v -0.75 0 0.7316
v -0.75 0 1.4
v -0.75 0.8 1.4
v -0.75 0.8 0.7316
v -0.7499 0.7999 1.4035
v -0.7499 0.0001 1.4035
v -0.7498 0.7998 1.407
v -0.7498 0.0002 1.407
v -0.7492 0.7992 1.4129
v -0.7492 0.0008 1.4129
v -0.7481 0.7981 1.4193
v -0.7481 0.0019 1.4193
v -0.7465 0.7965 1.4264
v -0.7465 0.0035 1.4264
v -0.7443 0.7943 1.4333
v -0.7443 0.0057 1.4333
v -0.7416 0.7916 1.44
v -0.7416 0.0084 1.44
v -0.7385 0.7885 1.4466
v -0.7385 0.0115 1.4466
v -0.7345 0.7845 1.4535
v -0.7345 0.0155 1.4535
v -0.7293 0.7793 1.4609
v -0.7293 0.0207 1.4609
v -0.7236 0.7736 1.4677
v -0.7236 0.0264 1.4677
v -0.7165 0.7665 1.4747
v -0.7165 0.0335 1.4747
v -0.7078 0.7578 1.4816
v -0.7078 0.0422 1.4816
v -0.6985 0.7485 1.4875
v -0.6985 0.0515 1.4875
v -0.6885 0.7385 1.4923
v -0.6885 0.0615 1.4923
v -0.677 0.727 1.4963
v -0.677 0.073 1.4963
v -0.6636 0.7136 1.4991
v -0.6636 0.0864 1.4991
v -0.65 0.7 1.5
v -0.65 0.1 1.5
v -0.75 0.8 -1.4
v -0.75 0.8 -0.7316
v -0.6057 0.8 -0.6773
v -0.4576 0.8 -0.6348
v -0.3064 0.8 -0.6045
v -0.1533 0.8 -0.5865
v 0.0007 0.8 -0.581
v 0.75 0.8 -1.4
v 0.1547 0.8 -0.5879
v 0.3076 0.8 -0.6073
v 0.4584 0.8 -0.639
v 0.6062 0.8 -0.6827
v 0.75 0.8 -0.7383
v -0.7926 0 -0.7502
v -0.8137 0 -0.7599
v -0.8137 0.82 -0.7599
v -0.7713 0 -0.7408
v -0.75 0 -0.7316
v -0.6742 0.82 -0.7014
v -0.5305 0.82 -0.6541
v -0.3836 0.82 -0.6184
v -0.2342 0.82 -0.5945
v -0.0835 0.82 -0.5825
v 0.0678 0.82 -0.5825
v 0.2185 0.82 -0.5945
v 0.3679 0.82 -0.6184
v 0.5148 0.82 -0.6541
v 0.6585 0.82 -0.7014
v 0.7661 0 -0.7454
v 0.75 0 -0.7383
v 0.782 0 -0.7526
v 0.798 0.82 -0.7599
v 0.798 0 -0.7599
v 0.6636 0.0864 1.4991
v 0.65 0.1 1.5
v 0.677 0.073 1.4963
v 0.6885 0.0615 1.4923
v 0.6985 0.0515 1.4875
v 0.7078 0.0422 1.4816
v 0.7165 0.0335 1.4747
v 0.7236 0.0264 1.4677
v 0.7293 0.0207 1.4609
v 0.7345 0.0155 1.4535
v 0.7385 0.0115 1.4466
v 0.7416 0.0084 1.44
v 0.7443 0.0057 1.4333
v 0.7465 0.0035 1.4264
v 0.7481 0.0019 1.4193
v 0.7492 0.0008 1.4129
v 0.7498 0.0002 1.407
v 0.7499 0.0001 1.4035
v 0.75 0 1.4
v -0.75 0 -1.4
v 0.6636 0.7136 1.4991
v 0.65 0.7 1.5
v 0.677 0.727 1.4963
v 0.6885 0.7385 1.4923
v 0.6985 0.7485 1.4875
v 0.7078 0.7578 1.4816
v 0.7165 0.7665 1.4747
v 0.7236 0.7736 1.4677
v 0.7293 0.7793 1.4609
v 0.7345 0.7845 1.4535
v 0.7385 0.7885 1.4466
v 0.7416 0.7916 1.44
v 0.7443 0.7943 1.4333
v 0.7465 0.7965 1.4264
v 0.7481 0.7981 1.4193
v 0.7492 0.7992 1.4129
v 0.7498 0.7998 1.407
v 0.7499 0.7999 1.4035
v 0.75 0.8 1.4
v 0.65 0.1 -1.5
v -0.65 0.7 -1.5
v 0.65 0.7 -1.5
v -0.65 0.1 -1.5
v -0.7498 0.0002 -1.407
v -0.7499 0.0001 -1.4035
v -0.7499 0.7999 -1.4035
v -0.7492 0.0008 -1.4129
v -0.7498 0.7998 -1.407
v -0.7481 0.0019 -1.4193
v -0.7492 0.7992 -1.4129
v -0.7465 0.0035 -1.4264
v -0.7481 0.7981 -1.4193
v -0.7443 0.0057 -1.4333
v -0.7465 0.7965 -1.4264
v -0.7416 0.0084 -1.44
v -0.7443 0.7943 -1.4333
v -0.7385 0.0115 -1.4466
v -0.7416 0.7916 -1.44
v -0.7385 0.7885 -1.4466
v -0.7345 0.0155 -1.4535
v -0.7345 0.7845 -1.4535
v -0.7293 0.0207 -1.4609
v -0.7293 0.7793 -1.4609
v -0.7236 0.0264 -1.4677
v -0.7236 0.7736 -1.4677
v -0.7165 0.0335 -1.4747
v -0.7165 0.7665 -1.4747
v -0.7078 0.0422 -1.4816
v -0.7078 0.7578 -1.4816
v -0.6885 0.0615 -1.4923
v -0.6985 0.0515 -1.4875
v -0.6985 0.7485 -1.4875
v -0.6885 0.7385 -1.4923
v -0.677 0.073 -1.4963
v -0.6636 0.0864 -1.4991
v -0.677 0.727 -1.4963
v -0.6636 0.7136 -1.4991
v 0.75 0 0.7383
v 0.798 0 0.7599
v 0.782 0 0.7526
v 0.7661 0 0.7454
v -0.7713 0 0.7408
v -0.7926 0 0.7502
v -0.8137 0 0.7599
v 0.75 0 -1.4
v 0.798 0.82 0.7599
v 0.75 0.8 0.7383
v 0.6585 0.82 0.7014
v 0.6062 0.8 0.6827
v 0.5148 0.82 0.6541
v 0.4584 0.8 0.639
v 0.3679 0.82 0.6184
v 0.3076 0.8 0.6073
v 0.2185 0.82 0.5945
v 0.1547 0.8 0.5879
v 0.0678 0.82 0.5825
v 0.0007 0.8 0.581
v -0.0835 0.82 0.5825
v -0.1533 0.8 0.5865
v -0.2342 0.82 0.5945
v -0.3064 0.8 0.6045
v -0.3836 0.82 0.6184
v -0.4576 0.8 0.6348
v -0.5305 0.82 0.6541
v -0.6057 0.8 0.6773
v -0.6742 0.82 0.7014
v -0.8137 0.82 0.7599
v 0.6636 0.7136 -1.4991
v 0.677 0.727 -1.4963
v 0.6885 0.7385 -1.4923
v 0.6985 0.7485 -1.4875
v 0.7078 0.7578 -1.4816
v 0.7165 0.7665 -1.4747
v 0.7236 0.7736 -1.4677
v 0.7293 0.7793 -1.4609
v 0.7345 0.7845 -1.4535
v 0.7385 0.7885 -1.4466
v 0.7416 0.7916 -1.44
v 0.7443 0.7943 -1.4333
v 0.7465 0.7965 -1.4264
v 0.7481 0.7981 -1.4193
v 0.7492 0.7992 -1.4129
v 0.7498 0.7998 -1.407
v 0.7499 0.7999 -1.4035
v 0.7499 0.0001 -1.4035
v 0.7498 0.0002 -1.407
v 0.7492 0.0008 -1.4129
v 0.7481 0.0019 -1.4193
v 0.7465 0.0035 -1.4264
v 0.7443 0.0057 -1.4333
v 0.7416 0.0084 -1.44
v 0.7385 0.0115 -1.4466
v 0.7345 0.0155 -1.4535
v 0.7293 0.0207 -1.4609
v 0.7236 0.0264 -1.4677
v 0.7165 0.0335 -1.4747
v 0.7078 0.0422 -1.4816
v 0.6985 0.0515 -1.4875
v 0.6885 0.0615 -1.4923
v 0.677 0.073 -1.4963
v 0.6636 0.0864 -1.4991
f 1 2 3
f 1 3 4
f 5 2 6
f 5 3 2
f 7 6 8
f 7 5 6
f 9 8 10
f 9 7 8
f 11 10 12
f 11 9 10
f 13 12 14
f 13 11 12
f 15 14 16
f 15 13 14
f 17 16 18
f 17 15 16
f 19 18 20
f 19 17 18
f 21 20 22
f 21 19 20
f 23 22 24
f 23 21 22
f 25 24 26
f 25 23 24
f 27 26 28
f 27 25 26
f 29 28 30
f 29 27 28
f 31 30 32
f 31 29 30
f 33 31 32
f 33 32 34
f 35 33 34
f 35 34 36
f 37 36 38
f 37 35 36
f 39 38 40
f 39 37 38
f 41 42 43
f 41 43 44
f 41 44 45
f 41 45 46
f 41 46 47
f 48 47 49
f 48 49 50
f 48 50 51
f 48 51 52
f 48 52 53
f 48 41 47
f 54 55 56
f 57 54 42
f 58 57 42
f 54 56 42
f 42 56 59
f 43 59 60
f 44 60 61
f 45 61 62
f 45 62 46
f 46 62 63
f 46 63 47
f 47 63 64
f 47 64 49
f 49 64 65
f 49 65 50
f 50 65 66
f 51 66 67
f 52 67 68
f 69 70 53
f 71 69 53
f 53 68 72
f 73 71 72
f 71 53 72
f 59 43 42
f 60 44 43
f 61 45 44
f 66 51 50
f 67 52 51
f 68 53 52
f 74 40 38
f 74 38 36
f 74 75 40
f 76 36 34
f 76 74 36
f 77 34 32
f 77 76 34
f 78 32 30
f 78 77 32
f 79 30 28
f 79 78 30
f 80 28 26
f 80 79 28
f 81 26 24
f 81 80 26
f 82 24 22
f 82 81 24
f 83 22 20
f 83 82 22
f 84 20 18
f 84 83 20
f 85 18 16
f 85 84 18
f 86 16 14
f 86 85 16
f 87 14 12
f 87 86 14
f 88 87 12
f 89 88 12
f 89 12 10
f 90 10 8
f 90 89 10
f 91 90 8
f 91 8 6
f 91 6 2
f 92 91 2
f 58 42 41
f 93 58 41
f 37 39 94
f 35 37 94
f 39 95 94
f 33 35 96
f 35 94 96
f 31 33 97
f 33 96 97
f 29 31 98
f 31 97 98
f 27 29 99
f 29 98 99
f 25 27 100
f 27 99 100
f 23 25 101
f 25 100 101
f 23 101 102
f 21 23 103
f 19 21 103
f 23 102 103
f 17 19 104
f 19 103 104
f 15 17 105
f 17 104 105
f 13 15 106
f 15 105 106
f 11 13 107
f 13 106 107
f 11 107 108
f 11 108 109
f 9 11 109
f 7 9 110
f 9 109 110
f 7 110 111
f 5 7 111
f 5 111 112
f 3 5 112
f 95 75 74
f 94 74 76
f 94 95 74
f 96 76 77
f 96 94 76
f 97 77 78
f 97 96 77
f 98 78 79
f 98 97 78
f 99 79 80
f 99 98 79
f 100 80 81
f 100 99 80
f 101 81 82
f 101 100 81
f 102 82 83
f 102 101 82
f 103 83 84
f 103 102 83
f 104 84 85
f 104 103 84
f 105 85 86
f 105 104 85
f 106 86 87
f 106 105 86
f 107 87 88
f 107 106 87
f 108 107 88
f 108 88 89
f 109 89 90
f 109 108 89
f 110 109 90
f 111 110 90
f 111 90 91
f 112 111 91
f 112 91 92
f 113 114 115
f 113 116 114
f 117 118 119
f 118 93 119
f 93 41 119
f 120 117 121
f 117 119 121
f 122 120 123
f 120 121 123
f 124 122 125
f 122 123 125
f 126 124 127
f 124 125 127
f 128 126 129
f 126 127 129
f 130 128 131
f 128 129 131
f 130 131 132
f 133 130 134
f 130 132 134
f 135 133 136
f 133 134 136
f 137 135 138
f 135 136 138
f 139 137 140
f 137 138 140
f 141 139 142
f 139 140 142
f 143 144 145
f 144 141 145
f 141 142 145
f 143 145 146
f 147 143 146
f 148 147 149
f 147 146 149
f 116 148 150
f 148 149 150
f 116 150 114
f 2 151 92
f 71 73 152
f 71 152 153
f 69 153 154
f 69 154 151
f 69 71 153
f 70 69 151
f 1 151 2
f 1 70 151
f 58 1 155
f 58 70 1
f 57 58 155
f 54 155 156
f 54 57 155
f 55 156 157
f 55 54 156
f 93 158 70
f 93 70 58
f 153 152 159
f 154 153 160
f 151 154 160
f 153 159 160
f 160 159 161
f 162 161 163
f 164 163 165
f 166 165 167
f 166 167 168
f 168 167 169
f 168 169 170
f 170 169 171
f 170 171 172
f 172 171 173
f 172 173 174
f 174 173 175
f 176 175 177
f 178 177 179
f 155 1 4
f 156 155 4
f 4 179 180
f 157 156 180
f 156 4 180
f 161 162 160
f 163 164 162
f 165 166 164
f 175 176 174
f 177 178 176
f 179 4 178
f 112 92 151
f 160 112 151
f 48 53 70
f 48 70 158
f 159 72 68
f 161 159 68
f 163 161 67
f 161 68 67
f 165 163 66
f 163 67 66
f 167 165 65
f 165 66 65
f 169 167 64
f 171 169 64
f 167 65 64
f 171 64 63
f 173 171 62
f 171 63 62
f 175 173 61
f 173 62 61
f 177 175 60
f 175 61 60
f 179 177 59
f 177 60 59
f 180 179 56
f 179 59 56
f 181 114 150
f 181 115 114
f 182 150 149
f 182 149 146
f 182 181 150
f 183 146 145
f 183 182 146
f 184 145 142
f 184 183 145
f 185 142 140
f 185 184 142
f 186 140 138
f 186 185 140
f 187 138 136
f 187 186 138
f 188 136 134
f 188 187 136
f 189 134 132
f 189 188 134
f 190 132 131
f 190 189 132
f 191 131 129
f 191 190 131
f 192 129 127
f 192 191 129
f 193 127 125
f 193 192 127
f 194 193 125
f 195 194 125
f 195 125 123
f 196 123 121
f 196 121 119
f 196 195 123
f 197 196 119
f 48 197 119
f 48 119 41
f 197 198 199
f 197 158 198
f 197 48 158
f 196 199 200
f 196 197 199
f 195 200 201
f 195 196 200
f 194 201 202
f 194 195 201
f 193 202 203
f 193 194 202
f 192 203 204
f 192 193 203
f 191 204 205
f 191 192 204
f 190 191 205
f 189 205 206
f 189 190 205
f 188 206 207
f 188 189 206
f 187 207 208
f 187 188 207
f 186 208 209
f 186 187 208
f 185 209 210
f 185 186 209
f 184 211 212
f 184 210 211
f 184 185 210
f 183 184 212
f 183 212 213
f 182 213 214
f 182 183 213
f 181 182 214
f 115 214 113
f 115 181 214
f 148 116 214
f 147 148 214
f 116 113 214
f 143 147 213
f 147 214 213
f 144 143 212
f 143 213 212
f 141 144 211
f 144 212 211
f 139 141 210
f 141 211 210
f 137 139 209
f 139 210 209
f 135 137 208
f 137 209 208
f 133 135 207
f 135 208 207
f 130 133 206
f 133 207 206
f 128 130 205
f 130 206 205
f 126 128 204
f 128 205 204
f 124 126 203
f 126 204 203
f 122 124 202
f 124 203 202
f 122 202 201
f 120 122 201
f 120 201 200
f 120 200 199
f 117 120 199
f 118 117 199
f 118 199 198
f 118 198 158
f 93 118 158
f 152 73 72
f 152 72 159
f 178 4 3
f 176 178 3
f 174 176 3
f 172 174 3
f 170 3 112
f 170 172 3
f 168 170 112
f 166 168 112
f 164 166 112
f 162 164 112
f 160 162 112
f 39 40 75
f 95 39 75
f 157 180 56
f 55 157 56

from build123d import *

# Parameters (mm, degrees)
ESQUISSE1_W             = 1.5
ESQUISSE1_H             = 3
BOSS_EXTRU_1_DEPTH      = 0.8
CONG_1_R                = 0.1
BOSS_EXTRU_2_DEPTH      = 0.02
BOSS_EXTRU_2_DEPTH_BACK = 0.8


with BuildPart() as part:
    # Esquisse1 → Boss.-Extru.1 (new body)
    with BuildSketch(Plane(origin=(0, 0, 0), x_dir=(1, 0, 0), z_dir=(0, 1, 0))):
        Rectangle(ESQUISSE1_W, ESQUISSE1_H)
    extrude(amount=BOSS_EXTRU_1_DEPTH)

    # Congé1
    cong_1_edges = [part.edges().sort_by_distance(p)[0] for p in [
        (0, 0.8, -1.5),
        (0, 0, -1.5),
        (0, 0, 1.5),
        (0, 0.8, 1.5),
        (-0.75, 0.4, -1.5),
        (0.75, 0.4, -1.5),
        (0.75, 0.4, 1.5),
        (-0.75, 0.4, 1.5),
    ]]
    fillet(cong_1_edges, radius=CONG_1_R)

    # Esquisse2 → Boss.-Extru.2 (add, two sides)
    with BuildSketch(Plane(origin=(0, 0.8, 0), x_dir=(1, 0, 0), z_dir=(0, 1, 0))) as boss_extru_2_sk:
        with BuildLine():
            Line((-0.813673936, -0.759907702), (-0.813673936, 0.759907702))
            ThreePointArc((-0.813673936, 0.759907702), (-0.007860433, 0.580975839), (0.797952705, 0.759909342))
            Line((0.797952705, 0.759909342), (0.797952705, -0.759909342))
            ThreePointArc((0.797952705, -0.759909342), (-0.007860433, -0.580975839), (-0.813673936, -0.759907702))
        make_face()
    extrude(amount=BOSS_EXTRU_2_DEPTH)
    extrude(boss_extru_2_sk.sketch, amount=-BOSS_EXTRU_2_DEPTH_BACK)


solid = part.part
